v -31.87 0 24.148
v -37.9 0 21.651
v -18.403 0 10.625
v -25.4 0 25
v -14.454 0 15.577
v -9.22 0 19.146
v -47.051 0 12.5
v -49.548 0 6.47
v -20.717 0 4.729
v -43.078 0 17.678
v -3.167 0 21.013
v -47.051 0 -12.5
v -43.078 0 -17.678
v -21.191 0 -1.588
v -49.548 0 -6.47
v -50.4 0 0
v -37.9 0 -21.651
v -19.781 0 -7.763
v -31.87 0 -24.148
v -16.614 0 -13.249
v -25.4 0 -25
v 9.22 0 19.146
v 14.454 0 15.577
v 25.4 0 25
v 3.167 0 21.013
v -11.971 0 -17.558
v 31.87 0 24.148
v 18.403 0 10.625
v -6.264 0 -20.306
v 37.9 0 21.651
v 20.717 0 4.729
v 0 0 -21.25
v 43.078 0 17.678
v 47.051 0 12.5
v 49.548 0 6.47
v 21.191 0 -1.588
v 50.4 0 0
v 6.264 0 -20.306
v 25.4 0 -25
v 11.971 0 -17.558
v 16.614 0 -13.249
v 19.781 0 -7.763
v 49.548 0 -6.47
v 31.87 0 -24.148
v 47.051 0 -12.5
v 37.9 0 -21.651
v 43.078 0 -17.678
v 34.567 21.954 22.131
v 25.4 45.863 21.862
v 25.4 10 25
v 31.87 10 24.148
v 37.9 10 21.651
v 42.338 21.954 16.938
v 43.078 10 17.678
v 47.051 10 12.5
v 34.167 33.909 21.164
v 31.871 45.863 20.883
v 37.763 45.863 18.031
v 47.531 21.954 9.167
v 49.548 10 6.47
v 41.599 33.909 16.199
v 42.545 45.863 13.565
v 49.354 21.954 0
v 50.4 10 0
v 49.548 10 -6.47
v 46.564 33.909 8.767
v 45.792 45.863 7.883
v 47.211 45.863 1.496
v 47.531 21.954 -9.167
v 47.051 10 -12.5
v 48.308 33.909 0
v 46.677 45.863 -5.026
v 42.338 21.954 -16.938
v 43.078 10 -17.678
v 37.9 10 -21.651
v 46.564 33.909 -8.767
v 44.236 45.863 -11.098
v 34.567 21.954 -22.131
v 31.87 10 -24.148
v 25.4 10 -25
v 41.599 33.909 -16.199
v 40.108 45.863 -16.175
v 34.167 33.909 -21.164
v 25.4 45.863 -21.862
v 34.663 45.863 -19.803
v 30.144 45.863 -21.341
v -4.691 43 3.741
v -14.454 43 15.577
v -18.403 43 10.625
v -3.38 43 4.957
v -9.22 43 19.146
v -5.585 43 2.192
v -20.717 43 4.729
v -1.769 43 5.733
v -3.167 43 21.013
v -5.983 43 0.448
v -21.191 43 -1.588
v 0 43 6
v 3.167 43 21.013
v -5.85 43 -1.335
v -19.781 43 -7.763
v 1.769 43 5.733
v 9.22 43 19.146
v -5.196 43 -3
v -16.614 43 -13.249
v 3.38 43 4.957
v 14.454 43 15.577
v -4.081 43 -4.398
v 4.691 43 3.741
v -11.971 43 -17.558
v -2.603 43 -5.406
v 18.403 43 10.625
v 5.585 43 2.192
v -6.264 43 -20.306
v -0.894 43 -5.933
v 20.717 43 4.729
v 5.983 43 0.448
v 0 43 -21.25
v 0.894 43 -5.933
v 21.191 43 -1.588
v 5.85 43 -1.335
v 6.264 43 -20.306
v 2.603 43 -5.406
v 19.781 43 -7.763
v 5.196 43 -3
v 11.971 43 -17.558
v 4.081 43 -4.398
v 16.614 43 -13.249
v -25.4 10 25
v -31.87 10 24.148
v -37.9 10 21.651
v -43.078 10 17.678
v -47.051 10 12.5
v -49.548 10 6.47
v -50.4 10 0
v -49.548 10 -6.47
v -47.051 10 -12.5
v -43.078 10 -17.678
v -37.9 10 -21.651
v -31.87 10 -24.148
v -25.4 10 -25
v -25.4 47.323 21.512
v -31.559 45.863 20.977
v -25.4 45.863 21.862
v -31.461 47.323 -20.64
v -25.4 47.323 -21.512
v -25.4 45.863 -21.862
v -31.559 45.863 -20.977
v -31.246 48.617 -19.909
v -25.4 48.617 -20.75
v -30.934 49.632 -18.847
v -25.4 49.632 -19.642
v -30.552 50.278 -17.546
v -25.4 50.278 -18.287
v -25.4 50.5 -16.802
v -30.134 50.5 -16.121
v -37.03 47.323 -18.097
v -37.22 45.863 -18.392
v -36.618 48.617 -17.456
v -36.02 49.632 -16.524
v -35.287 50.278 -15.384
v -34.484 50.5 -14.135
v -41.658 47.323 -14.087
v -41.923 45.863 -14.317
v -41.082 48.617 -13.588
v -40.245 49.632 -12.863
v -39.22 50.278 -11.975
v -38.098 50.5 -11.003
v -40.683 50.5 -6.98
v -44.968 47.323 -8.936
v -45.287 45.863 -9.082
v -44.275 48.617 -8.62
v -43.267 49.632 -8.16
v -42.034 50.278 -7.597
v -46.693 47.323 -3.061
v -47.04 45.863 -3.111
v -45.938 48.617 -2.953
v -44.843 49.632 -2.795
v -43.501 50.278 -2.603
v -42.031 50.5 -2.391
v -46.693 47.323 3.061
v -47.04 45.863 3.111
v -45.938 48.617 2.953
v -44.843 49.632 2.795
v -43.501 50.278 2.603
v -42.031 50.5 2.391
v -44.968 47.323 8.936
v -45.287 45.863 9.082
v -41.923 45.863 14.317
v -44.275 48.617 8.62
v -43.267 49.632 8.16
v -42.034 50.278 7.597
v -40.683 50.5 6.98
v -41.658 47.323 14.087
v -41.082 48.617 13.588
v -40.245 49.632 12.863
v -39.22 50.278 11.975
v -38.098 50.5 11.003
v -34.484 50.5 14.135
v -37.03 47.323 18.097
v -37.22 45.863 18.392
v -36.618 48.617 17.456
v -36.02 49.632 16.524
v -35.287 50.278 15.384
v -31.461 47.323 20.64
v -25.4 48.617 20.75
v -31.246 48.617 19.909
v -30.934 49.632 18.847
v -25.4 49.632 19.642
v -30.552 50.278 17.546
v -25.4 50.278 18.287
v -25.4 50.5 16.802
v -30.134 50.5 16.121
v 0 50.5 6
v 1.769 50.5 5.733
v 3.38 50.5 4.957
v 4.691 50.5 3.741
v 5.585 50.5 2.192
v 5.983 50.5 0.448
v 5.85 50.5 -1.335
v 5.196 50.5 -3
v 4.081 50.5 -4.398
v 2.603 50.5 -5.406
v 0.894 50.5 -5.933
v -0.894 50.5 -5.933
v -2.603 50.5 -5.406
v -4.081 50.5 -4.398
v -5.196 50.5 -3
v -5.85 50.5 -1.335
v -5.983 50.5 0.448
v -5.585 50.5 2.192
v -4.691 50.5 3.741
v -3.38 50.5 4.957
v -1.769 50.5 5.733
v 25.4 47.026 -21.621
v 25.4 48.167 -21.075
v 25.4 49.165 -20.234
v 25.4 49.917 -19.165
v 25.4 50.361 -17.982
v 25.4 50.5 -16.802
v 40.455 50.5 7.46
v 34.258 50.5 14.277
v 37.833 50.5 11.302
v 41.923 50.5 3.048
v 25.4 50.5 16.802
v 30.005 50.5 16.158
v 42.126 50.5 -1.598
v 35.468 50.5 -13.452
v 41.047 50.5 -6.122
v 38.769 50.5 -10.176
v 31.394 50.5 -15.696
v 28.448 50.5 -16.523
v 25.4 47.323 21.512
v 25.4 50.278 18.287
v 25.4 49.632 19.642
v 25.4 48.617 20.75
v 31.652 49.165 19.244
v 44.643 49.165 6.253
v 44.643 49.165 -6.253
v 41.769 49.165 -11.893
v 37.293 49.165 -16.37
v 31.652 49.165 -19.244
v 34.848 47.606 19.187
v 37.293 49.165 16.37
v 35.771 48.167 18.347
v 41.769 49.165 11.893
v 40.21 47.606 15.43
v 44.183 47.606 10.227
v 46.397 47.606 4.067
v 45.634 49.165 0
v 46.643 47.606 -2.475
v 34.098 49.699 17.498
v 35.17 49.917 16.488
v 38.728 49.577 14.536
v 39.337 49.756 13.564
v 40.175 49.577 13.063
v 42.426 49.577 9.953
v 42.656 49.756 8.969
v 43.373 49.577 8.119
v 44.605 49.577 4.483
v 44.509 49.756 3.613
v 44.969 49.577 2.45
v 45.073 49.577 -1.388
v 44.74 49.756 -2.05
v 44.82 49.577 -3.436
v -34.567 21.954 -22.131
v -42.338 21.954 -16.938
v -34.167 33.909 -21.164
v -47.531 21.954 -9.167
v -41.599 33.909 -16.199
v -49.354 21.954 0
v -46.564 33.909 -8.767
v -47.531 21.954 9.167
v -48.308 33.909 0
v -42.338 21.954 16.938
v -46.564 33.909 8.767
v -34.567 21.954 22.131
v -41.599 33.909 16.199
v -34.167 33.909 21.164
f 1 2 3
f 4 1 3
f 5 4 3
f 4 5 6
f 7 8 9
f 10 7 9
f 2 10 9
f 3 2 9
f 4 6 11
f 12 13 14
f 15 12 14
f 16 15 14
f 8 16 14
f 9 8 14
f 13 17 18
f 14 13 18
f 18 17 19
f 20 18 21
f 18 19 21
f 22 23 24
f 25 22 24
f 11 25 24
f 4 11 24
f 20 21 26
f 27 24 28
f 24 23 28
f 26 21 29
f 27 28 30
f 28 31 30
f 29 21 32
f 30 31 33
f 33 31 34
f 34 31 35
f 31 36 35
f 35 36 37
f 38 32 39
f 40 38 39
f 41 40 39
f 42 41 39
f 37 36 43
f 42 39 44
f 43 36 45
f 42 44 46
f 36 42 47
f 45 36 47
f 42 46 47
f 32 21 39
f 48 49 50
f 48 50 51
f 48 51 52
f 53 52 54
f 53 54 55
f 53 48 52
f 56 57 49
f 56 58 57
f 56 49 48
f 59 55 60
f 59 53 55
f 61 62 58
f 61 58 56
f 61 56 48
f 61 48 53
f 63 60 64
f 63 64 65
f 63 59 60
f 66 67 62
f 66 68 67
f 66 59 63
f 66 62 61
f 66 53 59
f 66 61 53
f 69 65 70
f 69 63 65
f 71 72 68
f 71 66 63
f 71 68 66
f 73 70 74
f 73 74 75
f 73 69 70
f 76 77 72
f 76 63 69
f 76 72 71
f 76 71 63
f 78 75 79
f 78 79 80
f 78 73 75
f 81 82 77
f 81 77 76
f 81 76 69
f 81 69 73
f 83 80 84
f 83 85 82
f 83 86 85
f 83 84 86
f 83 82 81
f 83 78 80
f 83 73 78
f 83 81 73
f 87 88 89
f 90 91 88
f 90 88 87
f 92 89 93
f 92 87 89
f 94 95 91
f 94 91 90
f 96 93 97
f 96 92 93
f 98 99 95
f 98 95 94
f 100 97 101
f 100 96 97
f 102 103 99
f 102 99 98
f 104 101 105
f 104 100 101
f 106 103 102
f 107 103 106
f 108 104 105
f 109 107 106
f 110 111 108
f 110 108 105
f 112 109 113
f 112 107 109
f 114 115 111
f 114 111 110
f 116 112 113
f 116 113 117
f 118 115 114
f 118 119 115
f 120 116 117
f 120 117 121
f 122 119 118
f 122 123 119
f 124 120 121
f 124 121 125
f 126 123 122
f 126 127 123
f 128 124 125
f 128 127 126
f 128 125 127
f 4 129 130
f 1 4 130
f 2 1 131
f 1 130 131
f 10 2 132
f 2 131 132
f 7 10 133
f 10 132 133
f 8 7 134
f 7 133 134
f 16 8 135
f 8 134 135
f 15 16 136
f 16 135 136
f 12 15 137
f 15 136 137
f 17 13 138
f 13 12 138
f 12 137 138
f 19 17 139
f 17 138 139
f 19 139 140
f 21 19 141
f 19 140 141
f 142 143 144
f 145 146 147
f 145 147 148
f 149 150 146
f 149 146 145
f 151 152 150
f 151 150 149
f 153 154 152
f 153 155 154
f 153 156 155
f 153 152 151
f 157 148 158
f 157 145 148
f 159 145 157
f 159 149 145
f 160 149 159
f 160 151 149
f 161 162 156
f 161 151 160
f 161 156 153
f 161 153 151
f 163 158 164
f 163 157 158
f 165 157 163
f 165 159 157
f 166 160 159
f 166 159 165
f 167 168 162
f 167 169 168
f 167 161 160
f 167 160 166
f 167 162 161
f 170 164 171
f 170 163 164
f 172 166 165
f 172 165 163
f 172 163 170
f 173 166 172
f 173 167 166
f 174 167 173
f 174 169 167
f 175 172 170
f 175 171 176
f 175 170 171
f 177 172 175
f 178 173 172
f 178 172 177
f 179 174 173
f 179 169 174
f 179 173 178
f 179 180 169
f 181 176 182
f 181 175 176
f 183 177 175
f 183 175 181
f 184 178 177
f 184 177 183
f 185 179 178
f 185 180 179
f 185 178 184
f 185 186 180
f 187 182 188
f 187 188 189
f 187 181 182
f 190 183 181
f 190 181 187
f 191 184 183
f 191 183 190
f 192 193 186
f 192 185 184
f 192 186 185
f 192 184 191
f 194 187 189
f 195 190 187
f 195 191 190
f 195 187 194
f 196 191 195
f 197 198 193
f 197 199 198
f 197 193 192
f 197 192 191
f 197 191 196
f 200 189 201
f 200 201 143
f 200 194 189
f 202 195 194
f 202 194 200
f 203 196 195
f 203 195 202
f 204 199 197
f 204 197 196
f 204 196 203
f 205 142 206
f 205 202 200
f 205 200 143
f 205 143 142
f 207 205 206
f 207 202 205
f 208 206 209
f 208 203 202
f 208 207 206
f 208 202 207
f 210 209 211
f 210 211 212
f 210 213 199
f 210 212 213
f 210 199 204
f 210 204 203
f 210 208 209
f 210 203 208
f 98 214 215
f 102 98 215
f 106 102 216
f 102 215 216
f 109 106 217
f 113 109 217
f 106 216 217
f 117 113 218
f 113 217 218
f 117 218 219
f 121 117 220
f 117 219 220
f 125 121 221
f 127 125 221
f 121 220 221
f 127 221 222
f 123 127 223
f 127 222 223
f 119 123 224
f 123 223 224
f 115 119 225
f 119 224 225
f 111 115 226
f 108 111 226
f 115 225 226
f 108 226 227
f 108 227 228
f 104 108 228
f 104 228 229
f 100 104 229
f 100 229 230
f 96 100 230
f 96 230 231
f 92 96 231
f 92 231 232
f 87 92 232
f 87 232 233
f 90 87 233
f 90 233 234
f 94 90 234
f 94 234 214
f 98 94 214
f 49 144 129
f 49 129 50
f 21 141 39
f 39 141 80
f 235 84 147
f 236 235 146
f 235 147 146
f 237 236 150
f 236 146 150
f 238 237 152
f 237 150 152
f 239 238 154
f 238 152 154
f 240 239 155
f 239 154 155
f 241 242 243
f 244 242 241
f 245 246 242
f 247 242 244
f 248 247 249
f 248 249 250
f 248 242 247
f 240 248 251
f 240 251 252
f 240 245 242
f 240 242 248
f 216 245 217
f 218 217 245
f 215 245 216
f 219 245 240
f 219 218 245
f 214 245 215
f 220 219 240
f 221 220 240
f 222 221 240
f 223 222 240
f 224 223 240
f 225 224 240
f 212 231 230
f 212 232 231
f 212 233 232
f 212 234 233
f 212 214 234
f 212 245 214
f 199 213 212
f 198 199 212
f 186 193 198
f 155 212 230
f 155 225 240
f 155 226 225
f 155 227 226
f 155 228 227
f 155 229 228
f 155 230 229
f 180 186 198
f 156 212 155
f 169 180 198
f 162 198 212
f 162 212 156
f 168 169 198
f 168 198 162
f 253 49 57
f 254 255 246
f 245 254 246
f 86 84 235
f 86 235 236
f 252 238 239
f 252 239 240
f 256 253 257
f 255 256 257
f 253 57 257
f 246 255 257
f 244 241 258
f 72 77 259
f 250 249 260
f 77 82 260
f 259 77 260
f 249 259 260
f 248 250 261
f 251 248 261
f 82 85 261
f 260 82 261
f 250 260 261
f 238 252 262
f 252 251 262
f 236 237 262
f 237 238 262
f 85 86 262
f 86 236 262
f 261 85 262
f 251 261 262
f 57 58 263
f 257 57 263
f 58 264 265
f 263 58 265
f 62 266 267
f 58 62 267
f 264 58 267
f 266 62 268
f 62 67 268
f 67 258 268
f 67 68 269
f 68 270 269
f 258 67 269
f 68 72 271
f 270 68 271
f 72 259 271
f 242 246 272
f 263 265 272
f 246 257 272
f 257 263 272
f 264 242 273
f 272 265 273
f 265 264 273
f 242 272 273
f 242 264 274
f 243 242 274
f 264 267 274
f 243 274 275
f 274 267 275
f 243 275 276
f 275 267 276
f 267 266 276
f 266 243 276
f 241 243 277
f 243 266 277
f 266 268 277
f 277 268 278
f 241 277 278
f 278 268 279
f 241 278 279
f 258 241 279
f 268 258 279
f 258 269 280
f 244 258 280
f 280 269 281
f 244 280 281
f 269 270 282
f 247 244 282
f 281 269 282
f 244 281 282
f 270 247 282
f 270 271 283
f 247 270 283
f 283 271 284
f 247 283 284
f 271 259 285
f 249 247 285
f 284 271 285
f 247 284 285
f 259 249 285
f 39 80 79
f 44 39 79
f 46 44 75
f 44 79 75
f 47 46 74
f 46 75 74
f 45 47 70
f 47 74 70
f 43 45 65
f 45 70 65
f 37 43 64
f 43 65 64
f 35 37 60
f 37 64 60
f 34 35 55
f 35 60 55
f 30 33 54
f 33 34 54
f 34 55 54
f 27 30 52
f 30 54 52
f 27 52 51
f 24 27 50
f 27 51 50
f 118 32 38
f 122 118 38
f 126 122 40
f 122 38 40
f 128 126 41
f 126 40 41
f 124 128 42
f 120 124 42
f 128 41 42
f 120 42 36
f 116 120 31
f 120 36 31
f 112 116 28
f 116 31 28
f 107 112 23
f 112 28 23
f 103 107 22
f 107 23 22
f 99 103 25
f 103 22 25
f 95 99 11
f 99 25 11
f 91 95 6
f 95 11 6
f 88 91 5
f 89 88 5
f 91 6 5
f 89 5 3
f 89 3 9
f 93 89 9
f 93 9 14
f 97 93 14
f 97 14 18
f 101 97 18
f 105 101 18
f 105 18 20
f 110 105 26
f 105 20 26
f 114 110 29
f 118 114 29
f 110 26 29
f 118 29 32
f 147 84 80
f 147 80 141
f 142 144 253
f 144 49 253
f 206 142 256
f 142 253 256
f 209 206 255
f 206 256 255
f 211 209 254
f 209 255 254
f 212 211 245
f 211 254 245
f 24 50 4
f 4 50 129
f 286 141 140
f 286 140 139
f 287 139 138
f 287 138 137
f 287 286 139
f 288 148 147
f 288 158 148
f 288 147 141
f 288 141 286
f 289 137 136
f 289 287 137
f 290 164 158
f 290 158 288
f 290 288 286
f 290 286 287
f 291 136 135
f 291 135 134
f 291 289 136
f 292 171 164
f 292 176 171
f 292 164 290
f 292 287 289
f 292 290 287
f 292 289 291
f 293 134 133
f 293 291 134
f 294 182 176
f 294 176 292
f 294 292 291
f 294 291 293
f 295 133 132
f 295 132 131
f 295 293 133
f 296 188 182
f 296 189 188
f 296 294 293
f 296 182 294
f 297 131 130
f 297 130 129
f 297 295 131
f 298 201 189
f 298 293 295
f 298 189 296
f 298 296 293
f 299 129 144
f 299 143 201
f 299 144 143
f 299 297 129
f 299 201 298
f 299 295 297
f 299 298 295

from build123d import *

# Parameters (mm, degrees)
SKETCH1_W           = 102.87
SKETCH1_H           = 52.07
BOSS_EXTRUDE2_DEPTH = 10
BOSS_EXTRUDE3_DEPTH = 40.5
BOSS_EXTRUDE3_TAPER = 5
SKETCH4_R           = 21.25
CUT_EXTRUDE2_DEPTH  = 43
FILLET1_R           = 5.08
SKETCH5_R           = 6
CUT_EXTRUDE3_DEPTH  = 77.639614104
SKETCH6_OUTSIDE_W   = 130.044
SKETCH6_OUTSIDE_H   = 79.244
CUT_EXTRUDE4_DEPTH  = 71.453037195


with BuildPart() as part:
    # Sketch1 → Boss-Extrude2 (new body)
    with BuildSketch(Plane(origin=(0, 0, 0), x_dir=(1, 0, 0), z_dir=(0, 1, 0))):
        Rectangle(SKETCH1_W, SKETCH1_H)
    extrude(amount=BOSS_EXTRUDE2_DEPTH)

    # Sketch3 → Boss-Extrude3 (add)
    with BuildSketch(Plane(origin=(0, 10, 0), x_dir=(1, 0, 0), z_dir=(0, 1, 0))):
        with BuildLine():
            ThreePointArc((-25.4, 25.000000038), (-50.400000038, 0), (-25.4, -25.000000038))
            Line((-25.4, -25.000000038), (25.4, -25.000000038))
            ThreePointArc((25.4, -25.000000038), (50.400000038, 0), (25.4, 25.000000038))
            Line((25.4, 25.000000038), (-25.4, 25.000000038))
        make_face()
    extrude(amount=BOSS_EXTRUDE3_DEPTH, taper=BOSS_EXTRUDE3_TAPER)

    # Sketch4 → Cut-Extrude2 (cut)
    with BuildSketch(Plane.XZ):
        with Locations(Location((0, 0, 0), (0, 0, 270))):
            Circle(SKETCH4_R)
    extrude(amount=-CUT_EXTRUDE2_DEPTH, mode=Mode.SUBTRACT)

    # Fillet1
    fillet1_edges = [part.edges().sort_by_distance(p)[0] for p in [
        (-46.856709165, 50.5, 0),
        (0, 50.5, 21.456709165),
        (46.856709165, 50.5, 0),
        (0, 50.5, -21.456709165),
    ]]
    fillet(fillet1_edges, radius=FILLET1_R)

    # Sketch5 → Cut-Extrude3 (cut, through all)
    with BuildSketch(Plane(origin=(0, 50.5, 0), x_dir=(1, 0, 0), z_dir=(0, 1, 0))):
        with Locations(Location((0, 0, 0), (0, 0, 270))):
            Circle(SKETCH5_R)
    extrude(amount=-CUT_EXTRUDE3_DEPTH, mode=Mode.SUBTRACT)

    # Sketch6 outside → Cut-Extrude4 (cut, through all)
    with BuildSketch(Plane(origin=(0, 10, 0), x_dir=(1, 0, 0), z_dir=(0, 1, 0))):
        Rectangle(SKETCH6_OUTSIDE_W, SKETCH6_OUTSIDE_H)
        with BuildLine():
            Line((-25.4, 25.000000038), (25.4, 25.000000038))
            ThreePointArc((25.4, 25.000000038), (50.400000038, 0), (25.4, -25.000000038))
            Line((25.4, -25.000000038), (-25.4, -25.000000038))
            ThreePointArc((-25.4, -25.000000038), (-50.400000038, 0), (-25.4, 25.000000038))
        make_face(mode=Mode.SUBTRACT)
    extrude(amount=-CUT_EXTRUDE4_DEPTH, mode=Mode.SUBTRACT)


solid = part.part
